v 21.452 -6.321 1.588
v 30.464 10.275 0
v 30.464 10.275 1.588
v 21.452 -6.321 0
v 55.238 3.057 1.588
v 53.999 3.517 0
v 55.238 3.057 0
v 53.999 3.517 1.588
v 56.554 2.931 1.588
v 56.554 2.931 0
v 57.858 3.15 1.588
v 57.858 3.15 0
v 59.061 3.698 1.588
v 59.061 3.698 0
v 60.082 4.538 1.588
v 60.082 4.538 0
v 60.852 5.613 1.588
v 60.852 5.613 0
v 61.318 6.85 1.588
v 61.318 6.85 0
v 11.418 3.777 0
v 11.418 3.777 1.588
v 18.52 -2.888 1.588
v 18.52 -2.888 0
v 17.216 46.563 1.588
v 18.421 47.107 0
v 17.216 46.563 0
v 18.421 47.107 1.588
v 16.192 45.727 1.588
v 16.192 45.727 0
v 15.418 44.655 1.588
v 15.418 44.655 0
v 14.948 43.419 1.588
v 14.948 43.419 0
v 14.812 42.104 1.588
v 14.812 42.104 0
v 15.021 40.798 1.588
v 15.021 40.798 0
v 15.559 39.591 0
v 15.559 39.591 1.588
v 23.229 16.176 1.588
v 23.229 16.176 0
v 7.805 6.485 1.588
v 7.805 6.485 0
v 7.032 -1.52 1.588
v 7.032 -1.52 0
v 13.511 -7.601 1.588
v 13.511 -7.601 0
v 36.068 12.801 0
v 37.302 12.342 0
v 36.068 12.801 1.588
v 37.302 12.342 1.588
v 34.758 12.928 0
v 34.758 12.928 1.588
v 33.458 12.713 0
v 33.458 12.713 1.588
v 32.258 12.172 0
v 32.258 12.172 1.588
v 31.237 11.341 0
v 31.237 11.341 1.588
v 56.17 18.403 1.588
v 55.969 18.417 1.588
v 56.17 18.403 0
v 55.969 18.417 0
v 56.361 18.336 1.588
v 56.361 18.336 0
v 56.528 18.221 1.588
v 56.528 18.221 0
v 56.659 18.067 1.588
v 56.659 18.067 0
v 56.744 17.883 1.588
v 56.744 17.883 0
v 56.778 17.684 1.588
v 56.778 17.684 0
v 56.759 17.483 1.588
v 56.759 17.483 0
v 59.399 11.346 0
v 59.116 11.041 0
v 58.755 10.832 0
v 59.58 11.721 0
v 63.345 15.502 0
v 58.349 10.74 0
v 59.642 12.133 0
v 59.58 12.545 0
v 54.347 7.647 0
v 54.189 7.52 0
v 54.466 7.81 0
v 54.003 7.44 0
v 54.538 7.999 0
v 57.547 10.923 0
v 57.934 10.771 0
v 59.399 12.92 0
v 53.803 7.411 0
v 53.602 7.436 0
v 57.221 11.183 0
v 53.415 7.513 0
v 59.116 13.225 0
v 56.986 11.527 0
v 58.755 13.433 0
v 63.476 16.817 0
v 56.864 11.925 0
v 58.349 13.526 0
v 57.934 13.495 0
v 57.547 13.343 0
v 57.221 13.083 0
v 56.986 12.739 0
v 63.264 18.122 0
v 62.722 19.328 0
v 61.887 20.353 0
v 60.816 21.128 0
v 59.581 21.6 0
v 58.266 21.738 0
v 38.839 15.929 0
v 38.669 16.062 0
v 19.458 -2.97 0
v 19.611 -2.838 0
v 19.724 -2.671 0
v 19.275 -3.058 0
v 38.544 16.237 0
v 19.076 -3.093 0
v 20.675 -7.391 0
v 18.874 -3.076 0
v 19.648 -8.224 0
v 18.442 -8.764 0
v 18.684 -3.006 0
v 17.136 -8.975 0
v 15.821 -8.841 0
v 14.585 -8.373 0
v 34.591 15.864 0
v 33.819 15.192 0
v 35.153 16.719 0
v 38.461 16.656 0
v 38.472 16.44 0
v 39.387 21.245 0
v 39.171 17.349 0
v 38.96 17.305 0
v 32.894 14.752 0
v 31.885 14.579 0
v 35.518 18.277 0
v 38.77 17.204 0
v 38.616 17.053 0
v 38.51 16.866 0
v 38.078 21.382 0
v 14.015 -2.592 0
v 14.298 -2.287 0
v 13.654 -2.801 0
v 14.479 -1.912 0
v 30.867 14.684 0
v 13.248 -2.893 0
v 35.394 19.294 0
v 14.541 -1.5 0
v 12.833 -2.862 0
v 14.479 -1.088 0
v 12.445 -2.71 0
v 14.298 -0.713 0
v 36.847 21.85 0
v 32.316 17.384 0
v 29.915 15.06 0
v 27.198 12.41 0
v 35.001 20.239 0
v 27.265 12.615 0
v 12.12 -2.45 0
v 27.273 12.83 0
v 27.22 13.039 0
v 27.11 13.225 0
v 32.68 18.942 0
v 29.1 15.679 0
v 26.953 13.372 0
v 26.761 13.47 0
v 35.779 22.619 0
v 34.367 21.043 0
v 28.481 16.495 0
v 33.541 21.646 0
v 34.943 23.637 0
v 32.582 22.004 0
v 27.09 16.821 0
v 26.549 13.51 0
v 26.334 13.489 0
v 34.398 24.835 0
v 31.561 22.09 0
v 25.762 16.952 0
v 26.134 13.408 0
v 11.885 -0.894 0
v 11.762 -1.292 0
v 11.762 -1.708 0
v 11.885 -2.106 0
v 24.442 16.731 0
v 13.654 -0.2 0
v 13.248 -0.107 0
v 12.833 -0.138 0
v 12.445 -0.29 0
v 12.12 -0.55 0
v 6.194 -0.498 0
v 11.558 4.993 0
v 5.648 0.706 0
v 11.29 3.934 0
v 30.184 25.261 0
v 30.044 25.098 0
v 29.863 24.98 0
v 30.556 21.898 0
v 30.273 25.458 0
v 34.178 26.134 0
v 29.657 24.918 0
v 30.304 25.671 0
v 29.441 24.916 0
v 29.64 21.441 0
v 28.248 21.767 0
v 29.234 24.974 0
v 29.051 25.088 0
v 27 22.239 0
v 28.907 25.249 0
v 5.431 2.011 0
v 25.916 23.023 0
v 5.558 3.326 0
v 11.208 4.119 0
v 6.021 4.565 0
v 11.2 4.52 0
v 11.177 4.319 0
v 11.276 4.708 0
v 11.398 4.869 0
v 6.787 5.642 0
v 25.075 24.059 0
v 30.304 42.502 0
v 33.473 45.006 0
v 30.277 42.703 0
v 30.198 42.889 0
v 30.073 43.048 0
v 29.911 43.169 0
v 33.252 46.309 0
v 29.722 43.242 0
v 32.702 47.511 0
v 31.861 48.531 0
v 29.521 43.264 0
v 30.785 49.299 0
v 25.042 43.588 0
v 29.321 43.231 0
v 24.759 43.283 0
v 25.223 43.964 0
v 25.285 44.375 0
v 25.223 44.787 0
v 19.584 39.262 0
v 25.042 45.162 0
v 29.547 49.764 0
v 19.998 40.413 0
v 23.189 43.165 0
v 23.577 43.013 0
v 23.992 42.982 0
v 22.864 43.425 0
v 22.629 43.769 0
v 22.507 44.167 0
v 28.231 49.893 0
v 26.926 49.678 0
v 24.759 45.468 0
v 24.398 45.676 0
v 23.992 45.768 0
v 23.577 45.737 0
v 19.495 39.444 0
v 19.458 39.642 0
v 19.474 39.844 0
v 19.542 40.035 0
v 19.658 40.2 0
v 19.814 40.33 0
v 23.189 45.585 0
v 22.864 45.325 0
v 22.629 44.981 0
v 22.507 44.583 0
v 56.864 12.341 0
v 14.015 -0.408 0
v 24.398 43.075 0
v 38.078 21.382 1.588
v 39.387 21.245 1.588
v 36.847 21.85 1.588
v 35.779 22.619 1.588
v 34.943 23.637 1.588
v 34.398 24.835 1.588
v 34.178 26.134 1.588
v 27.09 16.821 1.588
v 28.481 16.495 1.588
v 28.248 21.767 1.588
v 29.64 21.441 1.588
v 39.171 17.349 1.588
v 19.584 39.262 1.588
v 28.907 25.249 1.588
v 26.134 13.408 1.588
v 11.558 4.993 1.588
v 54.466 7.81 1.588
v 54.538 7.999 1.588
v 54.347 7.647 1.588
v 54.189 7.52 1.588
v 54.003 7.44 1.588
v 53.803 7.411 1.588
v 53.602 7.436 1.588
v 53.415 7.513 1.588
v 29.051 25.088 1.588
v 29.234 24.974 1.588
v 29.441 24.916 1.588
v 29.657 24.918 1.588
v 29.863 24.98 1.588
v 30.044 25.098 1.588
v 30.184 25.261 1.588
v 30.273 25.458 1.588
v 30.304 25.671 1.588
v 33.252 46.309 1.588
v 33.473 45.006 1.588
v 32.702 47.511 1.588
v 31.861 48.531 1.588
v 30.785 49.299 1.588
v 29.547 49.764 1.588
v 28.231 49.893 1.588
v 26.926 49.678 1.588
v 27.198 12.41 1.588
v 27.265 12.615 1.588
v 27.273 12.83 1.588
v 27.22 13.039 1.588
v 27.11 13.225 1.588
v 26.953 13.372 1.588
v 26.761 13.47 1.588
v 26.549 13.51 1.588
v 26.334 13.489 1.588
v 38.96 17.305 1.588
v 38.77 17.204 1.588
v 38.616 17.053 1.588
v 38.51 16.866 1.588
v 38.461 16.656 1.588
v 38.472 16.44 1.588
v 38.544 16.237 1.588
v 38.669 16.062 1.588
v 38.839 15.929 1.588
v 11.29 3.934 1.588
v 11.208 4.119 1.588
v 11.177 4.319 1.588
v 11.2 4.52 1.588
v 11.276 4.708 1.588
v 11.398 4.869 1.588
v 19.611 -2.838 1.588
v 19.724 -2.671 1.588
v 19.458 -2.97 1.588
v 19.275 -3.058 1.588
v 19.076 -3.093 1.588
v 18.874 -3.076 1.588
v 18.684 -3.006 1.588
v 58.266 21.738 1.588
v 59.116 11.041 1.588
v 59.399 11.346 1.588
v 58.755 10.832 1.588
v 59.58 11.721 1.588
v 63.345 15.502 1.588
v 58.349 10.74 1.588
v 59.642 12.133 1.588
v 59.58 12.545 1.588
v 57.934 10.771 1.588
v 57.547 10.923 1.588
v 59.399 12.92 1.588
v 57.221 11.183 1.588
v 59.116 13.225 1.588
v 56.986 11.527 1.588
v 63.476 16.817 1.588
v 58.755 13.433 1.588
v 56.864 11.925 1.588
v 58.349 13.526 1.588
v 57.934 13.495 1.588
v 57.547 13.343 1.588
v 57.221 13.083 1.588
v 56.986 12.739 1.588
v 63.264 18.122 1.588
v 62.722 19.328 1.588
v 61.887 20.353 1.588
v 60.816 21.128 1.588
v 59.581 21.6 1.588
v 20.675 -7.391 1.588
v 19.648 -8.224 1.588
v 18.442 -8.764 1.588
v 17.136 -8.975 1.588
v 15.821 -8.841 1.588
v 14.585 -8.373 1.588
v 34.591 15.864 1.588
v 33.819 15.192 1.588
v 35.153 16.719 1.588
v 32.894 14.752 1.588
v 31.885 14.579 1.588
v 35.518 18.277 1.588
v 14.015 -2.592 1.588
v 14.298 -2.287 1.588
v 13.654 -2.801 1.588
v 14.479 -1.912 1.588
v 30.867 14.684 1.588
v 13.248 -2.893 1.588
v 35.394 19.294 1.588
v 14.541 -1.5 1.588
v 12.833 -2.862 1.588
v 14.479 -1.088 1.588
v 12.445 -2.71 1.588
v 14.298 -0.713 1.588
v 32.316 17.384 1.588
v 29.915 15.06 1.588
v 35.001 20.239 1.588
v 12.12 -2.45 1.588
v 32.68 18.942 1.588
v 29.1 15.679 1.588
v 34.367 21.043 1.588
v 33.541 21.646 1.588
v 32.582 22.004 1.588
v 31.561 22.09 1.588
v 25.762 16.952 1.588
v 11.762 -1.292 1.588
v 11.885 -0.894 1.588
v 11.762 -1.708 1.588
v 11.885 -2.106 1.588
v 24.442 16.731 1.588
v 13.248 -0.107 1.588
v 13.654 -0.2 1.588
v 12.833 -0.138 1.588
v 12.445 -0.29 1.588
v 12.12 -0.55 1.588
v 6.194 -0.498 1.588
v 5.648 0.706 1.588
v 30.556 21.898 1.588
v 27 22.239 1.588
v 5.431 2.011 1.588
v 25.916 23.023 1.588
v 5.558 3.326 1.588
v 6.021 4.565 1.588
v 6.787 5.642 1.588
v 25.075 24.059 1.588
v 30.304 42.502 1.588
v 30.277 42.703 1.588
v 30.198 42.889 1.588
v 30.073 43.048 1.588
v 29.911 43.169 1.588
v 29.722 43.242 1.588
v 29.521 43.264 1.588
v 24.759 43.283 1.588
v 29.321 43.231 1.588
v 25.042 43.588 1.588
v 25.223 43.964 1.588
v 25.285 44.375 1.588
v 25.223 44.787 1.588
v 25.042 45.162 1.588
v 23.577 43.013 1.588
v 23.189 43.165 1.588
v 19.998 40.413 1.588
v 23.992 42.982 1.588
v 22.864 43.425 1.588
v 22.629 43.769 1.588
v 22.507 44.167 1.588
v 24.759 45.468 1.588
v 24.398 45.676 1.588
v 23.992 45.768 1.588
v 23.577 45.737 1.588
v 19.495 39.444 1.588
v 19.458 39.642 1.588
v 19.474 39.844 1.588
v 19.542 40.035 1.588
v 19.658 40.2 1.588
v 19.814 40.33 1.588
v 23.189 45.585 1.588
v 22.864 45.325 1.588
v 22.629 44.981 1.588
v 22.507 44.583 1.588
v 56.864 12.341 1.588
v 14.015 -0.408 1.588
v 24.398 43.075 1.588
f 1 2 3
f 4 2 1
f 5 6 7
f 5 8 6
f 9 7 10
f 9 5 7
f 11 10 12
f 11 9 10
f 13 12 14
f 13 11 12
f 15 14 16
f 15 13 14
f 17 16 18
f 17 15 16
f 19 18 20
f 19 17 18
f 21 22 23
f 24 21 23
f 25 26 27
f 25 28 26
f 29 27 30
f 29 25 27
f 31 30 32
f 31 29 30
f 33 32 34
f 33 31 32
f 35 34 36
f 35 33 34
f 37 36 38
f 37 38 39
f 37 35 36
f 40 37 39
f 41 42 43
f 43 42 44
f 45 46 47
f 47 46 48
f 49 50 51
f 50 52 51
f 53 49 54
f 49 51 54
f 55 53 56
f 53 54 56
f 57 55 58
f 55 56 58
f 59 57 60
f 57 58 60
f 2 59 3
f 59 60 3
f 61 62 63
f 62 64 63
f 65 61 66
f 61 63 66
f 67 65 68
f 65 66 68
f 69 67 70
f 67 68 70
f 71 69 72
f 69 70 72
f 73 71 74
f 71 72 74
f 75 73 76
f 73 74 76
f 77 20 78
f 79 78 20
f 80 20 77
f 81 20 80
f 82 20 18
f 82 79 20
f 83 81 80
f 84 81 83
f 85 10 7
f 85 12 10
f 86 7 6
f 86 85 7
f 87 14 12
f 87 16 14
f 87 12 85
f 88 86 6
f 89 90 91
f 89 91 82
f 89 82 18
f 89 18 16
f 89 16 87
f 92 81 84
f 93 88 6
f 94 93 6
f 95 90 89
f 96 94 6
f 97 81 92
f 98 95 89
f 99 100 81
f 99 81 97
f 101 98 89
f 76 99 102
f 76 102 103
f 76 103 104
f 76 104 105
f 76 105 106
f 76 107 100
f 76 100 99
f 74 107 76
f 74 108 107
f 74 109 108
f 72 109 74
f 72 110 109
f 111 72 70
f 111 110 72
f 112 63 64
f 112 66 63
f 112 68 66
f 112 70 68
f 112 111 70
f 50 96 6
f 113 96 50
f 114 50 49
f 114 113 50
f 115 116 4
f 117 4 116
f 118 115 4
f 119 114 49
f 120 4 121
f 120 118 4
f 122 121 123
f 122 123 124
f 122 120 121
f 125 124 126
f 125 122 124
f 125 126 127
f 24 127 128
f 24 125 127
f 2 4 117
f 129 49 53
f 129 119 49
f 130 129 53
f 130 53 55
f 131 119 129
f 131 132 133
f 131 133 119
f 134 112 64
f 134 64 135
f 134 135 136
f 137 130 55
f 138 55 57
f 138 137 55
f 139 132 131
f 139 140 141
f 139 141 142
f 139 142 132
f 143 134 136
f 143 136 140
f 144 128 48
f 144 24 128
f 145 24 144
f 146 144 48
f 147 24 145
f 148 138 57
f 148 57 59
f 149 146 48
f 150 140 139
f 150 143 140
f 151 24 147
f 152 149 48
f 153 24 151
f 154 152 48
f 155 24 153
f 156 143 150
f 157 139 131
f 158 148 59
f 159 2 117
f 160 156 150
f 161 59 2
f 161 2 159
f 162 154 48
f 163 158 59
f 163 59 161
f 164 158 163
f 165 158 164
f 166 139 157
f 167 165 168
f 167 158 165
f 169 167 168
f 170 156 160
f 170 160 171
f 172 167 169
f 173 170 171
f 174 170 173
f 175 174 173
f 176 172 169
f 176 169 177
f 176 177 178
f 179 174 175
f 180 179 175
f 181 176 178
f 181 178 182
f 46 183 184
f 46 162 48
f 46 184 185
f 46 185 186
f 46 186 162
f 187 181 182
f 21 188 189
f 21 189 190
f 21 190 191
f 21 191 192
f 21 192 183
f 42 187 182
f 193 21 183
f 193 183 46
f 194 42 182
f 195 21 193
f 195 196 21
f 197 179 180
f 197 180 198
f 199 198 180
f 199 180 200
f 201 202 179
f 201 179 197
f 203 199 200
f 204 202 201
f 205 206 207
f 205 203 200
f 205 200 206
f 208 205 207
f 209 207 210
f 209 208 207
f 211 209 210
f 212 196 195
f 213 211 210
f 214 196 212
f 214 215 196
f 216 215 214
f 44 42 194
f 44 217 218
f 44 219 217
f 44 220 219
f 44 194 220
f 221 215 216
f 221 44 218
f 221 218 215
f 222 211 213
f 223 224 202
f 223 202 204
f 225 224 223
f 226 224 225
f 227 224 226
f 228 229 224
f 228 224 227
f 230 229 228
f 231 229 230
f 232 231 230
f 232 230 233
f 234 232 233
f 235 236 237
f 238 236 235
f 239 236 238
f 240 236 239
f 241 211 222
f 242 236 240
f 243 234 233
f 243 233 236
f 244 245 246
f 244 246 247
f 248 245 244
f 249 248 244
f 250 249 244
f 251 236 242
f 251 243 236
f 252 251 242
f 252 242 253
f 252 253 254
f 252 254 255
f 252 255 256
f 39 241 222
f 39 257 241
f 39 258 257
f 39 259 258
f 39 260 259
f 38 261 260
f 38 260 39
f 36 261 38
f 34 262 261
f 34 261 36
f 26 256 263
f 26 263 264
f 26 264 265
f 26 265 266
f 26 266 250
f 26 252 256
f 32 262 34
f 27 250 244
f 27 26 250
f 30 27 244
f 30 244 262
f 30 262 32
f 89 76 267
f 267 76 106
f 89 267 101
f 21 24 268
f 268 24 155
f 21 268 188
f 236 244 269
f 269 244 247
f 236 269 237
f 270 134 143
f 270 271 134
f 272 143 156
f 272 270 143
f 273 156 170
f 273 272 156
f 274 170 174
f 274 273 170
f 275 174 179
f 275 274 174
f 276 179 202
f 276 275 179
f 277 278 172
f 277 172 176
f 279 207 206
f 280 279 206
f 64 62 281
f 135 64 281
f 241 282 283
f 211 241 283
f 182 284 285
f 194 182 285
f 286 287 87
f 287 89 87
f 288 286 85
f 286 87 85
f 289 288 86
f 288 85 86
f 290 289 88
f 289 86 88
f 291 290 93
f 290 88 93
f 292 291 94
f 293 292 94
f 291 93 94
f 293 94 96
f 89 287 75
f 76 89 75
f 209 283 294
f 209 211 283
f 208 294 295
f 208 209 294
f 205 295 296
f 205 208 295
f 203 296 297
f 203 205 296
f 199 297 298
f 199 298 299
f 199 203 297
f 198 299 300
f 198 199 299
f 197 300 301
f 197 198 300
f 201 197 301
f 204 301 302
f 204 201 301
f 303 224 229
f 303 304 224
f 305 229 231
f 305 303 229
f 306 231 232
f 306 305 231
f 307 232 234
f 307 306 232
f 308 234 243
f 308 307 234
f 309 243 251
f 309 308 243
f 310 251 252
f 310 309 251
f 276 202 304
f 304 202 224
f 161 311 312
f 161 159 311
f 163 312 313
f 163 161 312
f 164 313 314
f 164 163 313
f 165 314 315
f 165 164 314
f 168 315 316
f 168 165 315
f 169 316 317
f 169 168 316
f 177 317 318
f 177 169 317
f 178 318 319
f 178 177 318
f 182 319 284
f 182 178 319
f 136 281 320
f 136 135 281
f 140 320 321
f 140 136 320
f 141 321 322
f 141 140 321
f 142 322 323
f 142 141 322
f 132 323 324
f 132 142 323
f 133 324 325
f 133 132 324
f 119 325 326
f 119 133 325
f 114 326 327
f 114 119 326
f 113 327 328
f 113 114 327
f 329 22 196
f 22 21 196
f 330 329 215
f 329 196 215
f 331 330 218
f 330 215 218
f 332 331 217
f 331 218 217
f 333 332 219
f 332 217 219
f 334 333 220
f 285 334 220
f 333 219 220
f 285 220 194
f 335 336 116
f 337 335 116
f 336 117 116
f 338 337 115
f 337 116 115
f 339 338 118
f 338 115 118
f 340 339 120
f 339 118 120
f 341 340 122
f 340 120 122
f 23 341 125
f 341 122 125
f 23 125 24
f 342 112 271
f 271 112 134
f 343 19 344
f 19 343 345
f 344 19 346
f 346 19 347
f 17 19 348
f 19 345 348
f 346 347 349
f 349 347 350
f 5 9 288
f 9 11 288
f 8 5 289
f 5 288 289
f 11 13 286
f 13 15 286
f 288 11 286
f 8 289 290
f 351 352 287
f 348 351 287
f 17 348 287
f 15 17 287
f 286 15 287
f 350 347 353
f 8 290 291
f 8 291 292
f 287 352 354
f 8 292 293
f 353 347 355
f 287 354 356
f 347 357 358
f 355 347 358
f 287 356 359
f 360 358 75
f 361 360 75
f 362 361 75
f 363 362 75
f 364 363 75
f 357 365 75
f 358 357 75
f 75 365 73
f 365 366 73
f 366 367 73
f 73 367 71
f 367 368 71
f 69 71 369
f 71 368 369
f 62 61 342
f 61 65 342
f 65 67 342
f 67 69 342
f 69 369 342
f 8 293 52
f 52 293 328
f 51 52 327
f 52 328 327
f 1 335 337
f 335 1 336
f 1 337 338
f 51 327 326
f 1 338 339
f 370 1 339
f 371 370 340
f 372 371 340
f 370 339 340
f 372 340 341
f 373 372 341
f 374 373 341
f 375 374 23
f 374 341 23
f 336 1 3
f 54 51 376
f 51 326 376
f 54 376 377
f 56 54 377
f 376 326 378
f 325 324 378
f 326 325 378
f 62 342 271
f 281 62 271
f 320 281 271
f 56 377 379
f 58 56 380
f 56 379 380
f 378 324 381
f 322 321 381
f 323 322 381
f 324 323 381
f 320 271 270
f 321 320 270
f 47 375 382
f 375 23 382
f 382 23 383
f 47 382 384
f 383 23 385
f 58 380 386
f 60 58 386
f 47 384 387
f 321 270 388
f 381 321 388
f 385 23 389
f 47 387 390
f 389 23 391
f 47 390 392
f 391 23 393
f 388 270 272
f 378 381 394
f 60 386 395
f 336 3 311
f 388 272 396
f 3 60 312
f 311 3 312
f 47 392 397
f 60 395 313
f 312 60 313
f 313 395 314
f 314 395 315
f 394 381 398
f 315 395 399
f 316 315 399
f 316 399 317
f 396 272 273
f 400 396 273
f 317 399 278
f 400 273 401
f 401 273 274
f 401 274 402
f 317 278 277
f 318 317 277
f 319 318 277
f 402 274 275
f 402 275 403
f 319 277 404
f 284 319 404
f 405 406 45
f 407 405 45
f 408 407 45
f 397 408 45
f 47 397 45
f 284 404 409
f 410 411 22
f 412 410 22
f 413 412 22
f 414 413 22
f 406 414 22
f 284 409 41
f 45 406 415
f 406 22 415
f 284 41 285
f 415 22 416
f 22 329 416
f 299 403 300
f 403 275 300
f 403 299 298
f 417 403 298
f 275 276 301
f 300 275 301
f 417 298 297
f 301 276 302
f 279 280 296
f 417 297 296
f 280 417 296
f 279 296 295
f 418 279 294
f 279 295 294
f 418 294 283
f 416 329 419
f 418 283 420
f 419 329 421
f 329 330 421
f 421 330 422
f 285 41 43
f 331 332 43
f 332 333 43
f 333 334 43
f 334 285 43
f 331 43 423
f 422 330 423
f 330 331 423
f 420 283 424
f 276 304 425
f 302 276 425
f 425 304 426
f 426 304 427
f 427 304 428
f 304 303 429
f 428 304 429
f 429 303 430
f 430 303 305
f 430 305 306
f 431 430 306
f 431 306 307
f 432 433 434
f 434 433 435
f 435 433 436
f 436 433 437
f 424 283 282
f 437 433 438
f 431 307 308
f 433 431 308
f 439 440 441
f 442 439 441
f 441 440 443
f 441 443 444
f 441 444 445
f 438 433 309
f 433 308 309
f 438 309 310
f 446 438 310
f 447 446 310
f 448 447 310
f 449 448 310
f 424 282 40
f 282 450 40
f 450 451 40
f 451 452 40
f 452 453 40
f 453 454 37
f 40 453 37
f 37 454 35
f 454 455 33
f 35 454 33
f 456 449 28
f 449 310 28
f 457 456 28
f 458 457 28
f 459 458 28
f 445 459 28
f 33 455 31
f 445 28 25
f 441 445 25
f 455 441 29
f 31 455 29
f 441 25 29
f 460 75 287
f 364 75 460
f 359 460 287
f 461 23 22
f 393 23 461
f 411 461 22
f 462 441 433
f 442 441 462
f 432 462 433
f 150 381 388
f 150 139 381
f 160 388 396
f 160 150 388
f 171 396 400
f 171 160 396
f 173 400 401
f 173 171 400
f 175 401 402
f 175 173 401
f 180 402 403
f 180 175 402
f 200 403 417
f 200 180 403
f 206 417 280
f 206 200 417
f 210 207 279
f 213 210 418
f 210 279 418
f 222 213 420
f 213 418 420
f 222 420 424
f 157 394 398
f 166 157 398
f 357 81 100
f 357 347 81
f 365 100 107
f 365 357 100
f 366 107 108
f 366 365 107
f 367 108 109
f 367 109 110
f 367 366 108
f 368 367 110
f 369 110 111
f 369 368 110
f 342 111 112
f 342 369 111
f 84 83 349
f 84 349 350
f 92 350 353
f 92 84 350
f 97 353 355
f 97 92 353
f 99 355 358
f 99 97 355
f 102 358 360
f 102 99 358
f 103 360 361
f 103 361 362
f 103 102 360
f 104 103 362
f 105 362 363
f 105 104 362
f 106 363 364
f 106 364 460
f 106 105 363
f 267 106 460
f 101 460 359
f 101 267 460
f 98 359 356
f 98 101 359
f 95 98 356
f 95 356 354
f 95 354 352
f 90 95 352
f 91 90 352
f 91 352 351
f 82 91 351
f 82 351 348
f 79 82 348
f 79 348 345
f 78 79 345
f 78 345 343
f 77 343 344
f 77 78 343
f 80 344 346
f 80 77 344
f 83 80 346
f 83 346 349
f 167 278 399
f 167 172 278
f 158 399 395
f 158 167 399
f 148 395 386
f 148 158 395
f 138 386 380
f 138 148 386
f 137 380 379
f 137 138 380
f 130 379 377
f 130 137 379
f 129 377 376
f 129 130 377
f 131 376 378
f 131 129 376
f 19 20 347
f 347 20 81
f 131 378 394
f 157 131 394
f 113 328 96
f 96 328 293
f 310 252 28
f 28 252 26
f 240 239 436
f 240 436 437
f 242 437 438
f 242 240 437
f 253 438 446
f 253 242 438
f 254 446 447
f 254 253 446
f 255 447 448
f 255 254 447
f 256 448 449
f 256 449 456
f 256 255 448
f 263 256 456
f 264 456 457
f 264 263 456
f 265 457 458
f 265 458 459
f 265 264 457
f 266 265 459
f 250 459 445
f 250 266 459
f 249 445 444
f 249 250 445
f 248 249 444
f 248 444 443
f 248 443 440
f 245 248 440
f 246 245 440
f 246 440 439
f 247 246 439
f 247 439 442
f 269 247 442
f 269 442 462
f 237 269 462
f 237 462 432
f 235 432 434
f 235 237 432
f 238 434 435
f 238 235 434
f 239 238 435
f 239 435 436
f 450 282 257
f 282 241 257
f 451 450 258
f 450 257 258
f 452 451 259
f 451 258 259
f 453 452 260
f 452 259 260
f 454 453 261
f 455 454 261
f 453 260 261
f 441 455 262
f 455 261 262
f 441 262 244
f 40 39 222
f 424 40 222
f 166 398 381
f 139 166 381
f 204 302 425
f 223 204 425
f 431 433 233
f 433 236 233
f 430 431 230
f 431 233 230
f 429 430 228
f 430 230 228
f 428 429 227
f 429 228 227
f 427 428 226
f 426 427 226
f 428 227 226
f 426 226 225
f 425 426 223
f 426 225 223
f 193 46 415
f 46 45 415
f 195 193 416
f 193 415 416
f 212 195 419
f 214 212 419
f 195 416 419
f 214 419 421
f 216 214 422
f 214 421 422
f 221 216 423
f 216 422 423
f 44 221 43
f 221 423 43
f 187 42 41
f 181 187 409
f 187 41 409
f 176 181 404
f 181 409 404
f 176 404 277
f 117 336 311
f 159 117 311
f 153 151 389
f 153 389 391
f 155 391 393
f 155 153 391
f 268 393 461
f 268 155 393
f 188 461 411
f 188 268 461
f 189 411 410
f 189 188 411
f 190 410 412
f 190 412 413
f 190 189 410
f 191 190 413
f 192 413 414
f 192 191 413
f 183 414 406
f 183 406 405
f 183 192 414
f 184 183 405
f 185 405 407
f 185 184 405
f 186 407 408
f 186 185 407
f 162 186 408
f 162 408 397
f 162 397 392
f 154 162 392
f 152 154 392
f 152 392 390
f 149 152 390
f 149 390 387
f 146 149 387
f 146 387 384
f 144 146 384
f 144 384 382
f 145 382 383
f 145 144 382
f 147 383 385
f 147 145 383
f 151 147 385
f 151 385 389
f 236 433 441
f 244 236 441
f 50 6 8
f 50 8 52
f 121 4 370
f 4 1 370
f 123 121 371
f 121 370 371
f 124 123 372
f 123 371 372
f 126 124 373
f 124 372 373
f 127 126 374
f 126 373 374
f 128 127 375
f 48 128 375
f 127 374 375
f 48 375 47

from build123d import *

# Parameters (mm, degrees)
SKETCH1_R           = 3.7592
SKETCH1_R_2         = 1.397
BOSS_EXTRUDE1_DEPTH = 1.5875
CUT_EXTRUDE1_DEPTH  = 83.87509024
FILLET1_R           = 5.08
FILLET2_R           = 5.08
CUT_EXTRUDE2_REACH  = 82.757
BOSS_EXTRUDE2_DEPTH = 1.5875
FILLET3_R           = 5.08
CUT_EXTRUDE3_REACH  = 82.757
FILLET4_R           = 0.762


with BuildPart() as part:
    # Sketch1 → Boss-Extrude1 (new body)
    with BuildSketch(Plane.XY):
        Polygon((59.817595463, 0.441306322), (64.845697084, 21.910029909), (33.226760771, 51.582904103), (12.120249948, 45.203006047), (2.232255249, 2.983766862), (18.31066445, -12.105058669), align=None)
        with Locations((31.758870494, 18.335992429)):
            Circle(SKETCH1_R, mode=Mode.SUBTRACT)
        with Locations((13.143651596, -1.500084688)):
            Circle(SKETCH1_R_2, mode=Mode.SUBTRACT)
        with Locations((58.245026637, 12.132778525)):
            Circle(SKETCH1_R_2, mode=Mode.SUBTRACT)
        with Locations((23.887933249, 44.37528345)):
            Circle(SKETCH1_R_2, mode=Mode.SUBTRACT)
    extrude(amount=BOSS_EXTRUDE1_DEPTH)

    # Sketch2 → Cut-Extrude1 (cut, through all)
    with BuildSketch(Plane(origin=(0, 0, 0), x_dir=(-1, 0, 0), z_dir=(0, 0, -1))):
        Polygon((-33.226760771, 51.582904103), (-64.845697084, 21.910029909), (-34.366094464, 21.114208254), align=None)
        Polygon((-28.049253027, 19.204806708), (-2.232255249, 2.983766862), (-12.120249948, 45.203006047), align=None)
        Polygon((-32.861263991, 14.688962325), (-18.31066445, -12.105058669), (-59.817595463, 0.441306322), align=None)
    extrude(amount=-CUT_EXTRUDE1_DEPTH, mode=Mode.SUBTRACT)

    # Fillet1
    fillet1_edges = [part.edges().sort_by_distance(p)[0] for p in [
        (34.366094464, 21.114208254, 0.79375),
        (28.049253027, 19.204806708, 0.79375),
        (32.861263991, 14.688962325, 0.79375),
    ]]
    fillet(fillet1_edges, radius=FILLET1_R)

    # Fillet2
    fillet2_edges = [part.edges().sort_by_distance(p)[0] for p in [
        (18.31066445, -12.105058669, 0.79375),
        (2.232255249, 2.983766862, 0.79375),
        (12.120249948, 45.203006047, 0.79375),
        (33.226760771, 51.582904103, 0.79375),
        (64.845697084, 21.910029909, 0.79375),
        (59.817595463, 0.441306322, 0.79375),
    ]]
    fillet(fillet2_edges, radius=FILLET2_R)

    # Sketch3 → Cut-Extrude2 (cut, up to next)
    with BuildSketch(Plane(origin=(0, 0, 0), x_dir=(-1, 0, 0), z_dir=(0, 0, -1)), mode=Mode.PRIVATE) as cut_extrude2_sk1:
        with BuildLine():
            ThreePointArc((-27.999670494, 18.335992429), (-28.12209579, 17.384438756), (-28.481397666, 16.494863291))
            Line((-28.481397666, 16.494863291), (-24.797711818, 17.357604232))
            ThreePointArc((-24.797711818, 17.357604232), (-26.039580674, 19.67548382), (-25.956130857, 22.303760854))
            Line((-25.956130857, 22.303760854), (-29.639816705, 21.441019913))
            ThreePointArc((-29.639816705, 21.441019913), (-28.434902109, 20.091788208), (-27.999670494, 18.335992429))
        make_face()
    cut_extrude2_tool1 = extrude(cut_extrude2_sk1.sketch, amount=-CUT_EXTRUDE2_REACH, mode=Mode.PRIVATE) & part.part
    add(cut_extrude2_tool1.solids().sort_by_distance((27.120451, 19.422338, 0))[0], mode=Mode.SUBTRACT)

    # Sketch4 → Boss-Extrude2 (add)
    with BuildSketch(Plane.XY.offset(1.5875)):
        Polygon((32.680495966, 18.941790424), (35.601454601, 18.257684693), (35.236598188, 16.699839988), (32.315639553, 17.383945719), align=None)
    extrude(amount=-BOSS_EXTRUDE2_DEPTH)

    # Fillet3
    fillet3_edges = [part.edges().sort_by_distance(p)[0] for p in [
        (25.956130857, 22.303760854, 0.79375),
        (24.797711818, 17.357604232, 0.79375),
    ]]
    fillet(fillet3_edges, radius=FILLET3_R)

    # Sketch5 → Cut-Extrude3 (cut, up to next)
    with BuildSketch(Plane.XY.offset(1.5875), mode=Mode.PRIVATE) as cut_extrude3_sk1:
        Polygon((30.303711078, 23.150072166), (30.303711078, 43.528414036), (19.015506314, 40.116310717), align=None)
    cut_extrude3_tool1 = extrude(cut_extrude3_sk1.sketch, amount=-CUT_EXTRUDE3_REACH, mode=Mode.PRIVATE) & part.part
    # Sketch5 → Cut-Extrude3 (cut, up to next)
    with BuildSketch(Plane.XY.offset(1.5875), mode=Mode.PRIVATE) as cut_extrude3_sk2:
        Polygon((36.65556555, 17.189157581), (54.303727297, 6.999986646), (56.992861524, 18.481910394), align=None)
    cut_extrude3_tool2 = extrude(cut_extrude3_sk2.sketch, amount=-CUT_EXTRUDE3_REACH, mode=Mode.PRIVATE) & part.part
    # Sketch5 → Cut-Extrude3 (cut, up to next)
    with BuildSketch(Plane.XY.offset(1.5875), mode=Mode.PRIVATE) as cut_extrude3_sk3:
        Polygon((28.317334854, 14.66874754), (10.669173107, 4.479576605), (19.268243644, -3.590243825), align=None)
    cut_extrude3_tool3 = extrude(cut_extrude3_sk3.sketch, amount=-CUT_EXTRUDE3_REACH, mode=Mode.PRIVATE) & part.part
    add(cut_extrude3_tool1.solids().sort_by_distance((26.540976, 35.598266, 1.5875))[0], mode=Mode.SUBTRACT)
    add(cut_extrude3_tool2.solids().sort_by_distance((49.317385, 14.223685, 1.5875))[0], mode=Mode.SUBTRACT)
    add(cut_extrude3_tool3.solids().sort_by_distance((19.418251, 5.186027, 1.5875))[0], mode=Mode.SUBTRACT)

    # Fillet4
    fillet4_edges = [part.edges().sort_by_distance(p)[0] for p in [
        (19.015506314, 40.116310717, 0.79375),
        (30.303711078, 43.528414036, 0.79375),
        (30.303711078, 23.150072166, 0.79375),
        (56.992861524, 18.481910394, 0.79375),
        (54.303727297, 6.999986646, 0.79375),
        (36.65556555, 17.189157581, 0.79375),
        (19.268243644, -3.590243825, 0.79375),
        (10.669173107, 4.479576605, 0.79375),
        (28.317334854, 14.66874754, 0.79375),
    ]]
    fillet(fillet4_edges, radius=FILLET4_R)


solid = part.part
